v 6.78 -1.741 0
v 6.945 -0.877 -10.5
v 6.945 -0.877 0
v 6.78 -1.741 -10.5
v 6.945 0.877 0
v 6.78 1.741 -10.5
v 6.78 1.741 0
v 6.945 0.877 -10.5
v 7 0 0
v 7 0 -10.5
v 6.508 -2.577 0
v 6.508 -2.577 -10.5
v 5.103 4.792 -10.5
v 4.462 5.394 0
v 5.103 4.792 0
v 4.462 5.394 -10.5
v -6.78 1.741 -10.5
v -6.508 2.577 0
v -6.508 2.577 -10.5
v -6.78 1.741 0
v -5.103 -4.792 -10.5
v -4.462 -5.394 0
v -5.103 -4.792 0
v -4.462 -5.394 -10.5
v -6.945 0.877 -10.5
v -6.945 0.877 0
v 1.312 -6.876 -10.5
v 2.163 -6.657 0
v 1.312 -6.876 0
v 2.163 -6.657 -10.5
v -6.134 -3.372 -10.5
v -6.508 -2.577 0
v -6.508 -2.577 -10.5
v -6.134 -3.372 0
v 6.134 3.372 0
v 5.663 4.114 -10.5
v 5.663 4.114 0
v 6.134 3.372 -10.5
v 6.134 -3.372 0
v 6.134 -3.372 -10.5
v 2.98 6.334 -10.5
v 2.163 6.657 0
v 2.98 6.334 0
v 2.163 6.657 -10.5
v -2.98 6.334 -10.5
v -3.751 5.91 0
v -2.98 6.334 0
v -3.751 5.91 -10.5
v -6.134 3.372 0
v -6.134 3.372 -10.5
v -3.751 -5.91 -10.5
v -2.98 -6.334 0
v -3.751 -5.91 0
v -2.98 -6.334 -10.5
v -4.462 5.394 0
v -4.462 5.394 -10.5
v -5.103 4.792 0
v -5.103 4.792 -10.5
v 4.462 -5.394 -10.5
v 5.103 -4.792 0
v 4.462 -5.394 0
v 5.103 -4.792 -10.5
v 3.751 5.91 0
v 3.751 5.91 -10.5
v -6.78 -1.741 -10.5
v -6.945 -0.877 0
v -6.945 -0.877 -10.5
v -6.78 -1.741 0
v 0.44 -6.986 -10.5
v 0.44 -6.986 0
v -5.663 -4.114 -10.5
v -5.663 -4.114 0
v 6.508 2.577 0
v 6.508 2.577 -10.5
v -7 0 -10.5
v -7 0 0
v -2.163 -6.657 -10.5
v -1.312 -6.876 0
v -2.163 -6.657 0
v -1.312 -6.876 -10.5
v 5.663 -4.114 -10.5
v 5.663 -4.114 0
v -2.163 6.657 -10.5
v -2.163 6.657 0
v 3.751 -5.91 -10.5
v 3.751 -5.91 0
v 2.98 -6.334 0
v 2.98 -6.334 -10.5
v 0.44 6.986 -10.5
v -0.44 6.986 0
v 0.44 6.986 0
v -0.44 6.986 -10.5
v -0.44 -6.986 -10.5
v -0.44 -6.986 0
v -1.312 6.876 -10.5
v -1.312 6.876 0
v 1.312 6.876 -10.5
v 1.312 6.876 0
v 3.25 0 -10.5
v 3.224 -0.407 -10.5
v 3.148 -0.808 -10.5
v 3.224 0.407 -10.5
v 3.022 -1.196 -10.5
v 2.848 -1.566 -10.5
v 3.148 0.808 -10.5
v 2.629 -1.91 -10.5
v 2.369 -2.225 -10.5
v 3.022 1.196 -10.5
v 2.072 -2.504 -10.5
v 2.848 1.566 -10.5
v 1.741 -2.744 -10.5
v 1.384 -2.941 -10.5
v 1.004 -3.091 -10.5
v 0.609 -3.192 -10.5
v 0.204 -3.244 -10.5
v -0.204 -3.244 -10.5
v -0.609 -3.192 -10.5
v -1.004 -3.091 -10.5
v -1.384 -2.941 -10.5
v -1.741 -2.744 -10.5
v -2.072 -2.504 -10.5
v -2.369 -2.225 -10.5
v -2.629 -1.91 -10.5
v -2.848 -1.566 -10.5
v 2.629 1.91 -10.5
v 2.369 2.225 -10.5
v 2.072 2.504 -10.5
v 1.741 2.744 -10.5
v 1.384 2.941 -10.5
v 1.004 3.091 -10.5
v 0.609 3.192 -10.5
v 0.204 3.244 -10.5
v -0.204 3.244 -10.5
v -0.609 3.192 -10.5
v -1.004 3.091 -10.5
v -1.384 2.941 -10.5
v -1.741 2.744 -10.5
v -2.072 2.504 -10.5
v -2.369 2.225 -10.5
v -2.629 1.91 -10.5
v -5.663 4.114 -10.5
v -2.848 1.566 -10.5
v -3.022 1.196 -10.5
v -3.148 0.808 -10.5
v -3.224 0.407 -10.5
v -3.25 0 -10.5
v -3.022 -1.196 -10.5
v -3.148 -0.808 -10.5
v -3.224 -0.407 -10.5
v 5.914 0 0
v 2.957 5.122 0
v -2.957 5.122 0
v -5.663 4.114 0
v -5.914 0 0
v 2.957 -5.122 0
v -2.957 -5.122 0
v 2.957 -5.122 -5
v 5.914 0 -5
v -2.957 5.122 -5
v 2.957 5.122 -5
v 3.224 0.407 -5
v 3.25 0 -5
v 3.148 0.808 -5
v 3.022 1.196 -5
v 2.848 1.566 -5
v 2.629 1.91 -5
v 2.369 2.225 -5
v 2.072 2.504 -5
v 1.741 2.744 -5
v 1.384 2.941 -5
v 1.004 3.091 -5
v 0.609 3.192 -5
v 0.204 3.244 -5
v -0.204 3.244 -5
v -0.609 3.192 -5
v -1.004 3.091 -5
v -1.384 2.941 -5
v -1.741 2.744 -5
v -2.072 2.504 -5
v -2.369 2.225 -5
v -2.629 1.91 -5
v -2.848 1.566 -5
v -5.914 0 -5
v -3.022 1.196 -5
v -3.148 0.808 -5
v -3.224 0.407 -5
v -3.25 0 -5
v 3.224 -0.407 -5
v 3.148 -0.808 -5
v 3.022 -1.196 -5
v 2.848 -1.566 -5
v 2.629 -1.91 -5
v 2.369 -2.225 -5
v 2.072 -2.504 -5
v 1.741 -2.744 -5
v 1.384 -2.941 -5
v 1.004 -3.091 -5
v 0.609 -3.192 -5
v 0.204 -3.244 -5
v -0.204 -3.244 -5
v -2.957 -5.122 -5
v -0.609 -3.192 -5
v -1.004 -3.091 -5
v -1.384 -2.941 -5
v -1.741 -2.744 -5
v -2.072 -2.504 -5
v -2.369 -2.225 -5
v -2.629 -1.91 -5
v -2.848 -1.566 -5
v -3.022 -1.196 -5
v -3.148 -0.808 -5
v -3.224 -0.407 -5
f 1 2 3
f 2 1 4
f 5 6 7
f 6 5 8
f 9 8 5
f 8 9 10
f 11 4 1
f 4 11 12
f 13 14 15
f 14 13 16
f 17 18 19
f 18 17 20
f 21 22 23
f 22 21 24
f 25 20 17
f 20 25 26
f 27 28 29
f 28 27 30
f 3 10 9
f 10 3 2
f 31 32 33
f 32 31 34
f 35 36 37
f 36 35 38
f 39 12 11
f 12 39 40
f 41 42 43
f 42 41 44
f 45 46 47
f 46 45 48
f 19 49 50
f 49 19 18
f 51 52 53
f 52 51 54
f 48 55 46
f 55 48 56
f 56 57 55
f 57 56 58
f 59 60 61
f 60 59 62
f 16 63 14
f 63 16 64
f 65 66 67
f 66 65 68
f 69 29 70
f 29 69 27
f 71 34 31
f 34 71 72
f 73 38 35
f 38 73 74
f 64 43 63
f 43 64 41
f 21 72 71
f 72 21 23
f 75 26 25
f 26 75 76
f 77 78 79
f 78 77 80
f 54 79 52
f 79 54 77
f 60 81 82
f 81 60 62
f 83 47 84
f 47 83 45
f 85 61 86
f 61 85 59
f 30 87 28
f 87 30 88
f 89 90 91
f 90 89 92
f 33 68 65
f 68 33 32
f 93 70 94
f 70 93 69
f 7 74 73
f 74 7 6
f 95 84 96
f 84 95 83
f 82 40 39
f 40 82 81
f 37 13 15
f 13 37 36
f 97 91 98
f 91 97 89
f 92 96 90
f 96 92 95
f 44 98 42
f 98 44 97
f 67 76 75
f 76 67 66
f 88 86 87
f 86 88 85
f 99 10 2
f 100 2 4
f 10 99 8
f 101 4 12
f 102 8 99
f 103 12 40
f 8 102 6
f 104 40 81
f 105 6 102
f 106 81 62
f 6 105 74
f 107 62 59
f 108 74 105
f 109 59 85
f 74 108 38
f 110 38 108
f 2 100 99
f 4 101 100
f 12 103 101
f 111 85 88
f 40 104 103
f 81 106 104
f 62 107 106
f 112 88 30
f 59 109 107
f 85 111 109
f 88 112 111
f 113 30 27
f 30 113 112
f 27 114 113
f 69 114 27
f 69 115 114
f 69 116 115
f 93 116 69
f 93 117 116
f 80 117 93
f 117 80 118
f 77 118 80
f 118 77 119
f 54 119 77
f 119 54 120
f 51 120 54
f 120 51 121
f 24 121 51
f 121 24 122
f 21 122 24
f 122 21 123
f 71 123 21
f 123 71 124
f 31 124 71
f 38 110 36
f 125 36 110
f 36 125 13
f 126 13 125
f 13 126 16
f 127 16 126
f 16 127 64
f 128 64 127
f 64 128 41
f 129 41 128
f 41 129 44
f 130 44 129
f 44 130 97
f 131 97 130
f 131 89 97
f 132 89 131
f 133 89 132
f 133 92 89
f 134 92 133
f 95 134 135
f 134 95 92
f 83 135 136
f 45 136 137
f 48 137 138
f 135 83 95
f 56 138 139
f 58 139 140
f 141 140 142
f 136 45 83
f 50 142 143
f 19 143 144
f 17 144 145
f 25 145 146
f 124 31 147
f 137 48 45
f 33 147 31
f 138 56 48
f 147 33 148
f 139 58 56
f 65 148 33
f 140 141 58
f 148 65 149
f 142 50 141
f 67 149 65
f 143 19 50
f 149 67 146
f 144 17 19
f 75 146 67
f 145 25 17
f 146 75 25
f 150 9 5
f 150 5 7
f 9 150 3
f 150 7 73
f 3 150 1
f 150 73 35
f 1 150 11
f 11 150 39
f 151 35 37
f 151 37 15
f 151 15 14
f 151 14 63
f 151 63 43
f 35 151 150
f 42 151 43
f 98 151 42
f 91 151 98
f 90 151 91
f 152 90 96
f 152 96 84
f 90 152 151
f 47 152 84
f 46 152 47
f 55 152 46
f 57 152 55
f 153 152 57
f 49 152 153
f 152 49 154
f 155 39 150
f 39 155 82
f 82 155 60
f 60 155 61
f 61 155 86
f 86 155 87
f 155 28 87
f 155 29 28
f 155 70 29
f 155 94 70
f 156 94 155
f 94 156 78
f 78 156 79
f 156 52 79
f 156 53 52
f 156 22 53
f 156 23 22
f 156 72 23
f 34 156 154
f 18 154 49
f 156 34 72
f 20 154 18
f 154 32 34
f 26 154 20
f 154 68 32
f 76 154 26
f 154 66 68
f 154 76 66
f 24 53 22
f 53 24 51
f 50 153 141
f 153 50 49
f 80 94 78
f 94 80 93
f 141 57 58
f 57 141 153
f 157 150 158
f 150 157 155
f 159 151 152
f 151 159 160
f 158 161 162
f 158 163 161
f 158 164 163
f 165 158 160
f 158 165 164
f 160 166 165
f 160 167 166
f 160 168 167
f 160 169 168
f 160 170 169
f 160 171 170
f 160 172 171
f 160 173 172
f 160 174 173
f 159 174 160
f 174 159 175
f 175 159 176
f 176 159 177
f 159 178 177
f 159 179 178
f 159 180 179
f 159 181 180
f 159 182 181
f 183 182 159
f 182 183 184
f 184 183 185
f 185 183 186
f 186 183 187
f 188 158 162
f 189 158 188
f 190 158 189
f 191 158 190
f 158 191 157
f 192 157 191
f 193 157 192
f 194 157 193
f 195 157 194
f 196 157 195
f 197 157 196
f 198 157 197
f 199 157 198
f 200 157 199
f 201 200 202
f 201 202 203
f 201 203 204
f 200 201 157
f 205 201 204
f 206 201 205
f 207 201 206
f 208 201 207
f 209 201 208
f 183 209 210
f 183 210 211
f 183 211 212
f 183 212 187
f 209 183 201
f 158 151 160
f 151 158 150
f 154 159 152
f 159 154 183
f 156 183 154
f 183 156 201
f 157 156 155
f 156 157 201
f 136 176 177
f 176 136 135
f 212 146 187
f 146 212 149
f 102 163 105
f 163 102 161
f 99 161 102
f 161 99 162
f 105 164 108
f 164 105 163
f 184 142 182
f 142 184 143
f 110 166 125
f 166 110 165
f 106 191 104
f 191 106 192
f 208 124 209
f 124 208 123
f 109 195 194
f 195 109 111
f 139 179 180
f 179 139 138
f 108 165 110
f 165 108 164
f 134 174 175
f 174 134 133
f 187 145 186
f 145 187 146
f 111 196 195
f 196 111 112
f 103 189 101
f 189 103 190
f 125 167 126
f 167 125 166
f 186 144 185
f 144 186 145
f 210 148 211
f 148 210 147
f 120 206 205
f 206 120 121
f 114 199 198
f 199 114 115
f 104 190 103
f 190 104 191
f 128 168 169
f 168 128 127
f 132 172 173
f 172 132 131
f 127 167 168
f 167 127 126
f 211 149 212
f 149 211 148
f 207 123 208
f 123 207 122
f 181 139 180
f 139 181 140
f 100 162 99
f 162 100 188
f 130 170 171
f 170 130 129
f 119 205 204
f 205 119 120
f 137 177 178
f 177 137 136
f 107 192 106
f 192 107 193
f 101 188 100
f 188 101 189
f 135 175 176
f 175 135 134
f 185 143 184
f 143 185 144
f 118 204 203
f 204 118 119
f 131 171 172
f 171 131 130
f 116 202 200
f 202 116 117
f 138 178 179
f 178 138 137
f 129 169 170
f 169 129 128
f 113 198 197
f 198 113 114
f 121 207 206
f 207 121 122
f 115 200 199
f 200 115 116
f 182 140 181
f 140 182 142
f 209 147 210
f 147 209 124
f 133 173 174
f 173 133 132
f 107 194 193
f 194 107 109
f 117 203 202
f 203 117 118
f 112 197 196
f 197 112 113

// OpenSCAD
$fn = 50;


difference() {
	union() {
		translate(v = [0, 0, -10.5000000000]) {
			cylinder(h = 10.5000000000, r = 7.0000000000);
		}
		translate(v = [0, 0, -9.0000000000]) {
			cylinder(h = 9, r = 2.8750000000);
		}
	}
	union() {
		translate(v = [0, 0, 0]) {
			rotate(a = [0, 0, 0]) {
				difference() {
					union() {
						translate(v = [0, 0, -5]) {
							linear_extrude(height = 5) {
								polygon(points = [[5.9142500000, 0.0000000000], [2.9571250000, 5.1218907443], [-2.9571250000, 5.1218907443], [-5.9142500000, 0.0000000000], [-2.9571250000, -5.1218907443], [2.9571250000, -5.1218907443]]);
							}
						}
					}
					union();
				}
			}
		}
		#translate(v = [0, 0, -100.0000000000]) {
			cylinder(h = 200, r = 3.2500000000);
		}
	}
}
